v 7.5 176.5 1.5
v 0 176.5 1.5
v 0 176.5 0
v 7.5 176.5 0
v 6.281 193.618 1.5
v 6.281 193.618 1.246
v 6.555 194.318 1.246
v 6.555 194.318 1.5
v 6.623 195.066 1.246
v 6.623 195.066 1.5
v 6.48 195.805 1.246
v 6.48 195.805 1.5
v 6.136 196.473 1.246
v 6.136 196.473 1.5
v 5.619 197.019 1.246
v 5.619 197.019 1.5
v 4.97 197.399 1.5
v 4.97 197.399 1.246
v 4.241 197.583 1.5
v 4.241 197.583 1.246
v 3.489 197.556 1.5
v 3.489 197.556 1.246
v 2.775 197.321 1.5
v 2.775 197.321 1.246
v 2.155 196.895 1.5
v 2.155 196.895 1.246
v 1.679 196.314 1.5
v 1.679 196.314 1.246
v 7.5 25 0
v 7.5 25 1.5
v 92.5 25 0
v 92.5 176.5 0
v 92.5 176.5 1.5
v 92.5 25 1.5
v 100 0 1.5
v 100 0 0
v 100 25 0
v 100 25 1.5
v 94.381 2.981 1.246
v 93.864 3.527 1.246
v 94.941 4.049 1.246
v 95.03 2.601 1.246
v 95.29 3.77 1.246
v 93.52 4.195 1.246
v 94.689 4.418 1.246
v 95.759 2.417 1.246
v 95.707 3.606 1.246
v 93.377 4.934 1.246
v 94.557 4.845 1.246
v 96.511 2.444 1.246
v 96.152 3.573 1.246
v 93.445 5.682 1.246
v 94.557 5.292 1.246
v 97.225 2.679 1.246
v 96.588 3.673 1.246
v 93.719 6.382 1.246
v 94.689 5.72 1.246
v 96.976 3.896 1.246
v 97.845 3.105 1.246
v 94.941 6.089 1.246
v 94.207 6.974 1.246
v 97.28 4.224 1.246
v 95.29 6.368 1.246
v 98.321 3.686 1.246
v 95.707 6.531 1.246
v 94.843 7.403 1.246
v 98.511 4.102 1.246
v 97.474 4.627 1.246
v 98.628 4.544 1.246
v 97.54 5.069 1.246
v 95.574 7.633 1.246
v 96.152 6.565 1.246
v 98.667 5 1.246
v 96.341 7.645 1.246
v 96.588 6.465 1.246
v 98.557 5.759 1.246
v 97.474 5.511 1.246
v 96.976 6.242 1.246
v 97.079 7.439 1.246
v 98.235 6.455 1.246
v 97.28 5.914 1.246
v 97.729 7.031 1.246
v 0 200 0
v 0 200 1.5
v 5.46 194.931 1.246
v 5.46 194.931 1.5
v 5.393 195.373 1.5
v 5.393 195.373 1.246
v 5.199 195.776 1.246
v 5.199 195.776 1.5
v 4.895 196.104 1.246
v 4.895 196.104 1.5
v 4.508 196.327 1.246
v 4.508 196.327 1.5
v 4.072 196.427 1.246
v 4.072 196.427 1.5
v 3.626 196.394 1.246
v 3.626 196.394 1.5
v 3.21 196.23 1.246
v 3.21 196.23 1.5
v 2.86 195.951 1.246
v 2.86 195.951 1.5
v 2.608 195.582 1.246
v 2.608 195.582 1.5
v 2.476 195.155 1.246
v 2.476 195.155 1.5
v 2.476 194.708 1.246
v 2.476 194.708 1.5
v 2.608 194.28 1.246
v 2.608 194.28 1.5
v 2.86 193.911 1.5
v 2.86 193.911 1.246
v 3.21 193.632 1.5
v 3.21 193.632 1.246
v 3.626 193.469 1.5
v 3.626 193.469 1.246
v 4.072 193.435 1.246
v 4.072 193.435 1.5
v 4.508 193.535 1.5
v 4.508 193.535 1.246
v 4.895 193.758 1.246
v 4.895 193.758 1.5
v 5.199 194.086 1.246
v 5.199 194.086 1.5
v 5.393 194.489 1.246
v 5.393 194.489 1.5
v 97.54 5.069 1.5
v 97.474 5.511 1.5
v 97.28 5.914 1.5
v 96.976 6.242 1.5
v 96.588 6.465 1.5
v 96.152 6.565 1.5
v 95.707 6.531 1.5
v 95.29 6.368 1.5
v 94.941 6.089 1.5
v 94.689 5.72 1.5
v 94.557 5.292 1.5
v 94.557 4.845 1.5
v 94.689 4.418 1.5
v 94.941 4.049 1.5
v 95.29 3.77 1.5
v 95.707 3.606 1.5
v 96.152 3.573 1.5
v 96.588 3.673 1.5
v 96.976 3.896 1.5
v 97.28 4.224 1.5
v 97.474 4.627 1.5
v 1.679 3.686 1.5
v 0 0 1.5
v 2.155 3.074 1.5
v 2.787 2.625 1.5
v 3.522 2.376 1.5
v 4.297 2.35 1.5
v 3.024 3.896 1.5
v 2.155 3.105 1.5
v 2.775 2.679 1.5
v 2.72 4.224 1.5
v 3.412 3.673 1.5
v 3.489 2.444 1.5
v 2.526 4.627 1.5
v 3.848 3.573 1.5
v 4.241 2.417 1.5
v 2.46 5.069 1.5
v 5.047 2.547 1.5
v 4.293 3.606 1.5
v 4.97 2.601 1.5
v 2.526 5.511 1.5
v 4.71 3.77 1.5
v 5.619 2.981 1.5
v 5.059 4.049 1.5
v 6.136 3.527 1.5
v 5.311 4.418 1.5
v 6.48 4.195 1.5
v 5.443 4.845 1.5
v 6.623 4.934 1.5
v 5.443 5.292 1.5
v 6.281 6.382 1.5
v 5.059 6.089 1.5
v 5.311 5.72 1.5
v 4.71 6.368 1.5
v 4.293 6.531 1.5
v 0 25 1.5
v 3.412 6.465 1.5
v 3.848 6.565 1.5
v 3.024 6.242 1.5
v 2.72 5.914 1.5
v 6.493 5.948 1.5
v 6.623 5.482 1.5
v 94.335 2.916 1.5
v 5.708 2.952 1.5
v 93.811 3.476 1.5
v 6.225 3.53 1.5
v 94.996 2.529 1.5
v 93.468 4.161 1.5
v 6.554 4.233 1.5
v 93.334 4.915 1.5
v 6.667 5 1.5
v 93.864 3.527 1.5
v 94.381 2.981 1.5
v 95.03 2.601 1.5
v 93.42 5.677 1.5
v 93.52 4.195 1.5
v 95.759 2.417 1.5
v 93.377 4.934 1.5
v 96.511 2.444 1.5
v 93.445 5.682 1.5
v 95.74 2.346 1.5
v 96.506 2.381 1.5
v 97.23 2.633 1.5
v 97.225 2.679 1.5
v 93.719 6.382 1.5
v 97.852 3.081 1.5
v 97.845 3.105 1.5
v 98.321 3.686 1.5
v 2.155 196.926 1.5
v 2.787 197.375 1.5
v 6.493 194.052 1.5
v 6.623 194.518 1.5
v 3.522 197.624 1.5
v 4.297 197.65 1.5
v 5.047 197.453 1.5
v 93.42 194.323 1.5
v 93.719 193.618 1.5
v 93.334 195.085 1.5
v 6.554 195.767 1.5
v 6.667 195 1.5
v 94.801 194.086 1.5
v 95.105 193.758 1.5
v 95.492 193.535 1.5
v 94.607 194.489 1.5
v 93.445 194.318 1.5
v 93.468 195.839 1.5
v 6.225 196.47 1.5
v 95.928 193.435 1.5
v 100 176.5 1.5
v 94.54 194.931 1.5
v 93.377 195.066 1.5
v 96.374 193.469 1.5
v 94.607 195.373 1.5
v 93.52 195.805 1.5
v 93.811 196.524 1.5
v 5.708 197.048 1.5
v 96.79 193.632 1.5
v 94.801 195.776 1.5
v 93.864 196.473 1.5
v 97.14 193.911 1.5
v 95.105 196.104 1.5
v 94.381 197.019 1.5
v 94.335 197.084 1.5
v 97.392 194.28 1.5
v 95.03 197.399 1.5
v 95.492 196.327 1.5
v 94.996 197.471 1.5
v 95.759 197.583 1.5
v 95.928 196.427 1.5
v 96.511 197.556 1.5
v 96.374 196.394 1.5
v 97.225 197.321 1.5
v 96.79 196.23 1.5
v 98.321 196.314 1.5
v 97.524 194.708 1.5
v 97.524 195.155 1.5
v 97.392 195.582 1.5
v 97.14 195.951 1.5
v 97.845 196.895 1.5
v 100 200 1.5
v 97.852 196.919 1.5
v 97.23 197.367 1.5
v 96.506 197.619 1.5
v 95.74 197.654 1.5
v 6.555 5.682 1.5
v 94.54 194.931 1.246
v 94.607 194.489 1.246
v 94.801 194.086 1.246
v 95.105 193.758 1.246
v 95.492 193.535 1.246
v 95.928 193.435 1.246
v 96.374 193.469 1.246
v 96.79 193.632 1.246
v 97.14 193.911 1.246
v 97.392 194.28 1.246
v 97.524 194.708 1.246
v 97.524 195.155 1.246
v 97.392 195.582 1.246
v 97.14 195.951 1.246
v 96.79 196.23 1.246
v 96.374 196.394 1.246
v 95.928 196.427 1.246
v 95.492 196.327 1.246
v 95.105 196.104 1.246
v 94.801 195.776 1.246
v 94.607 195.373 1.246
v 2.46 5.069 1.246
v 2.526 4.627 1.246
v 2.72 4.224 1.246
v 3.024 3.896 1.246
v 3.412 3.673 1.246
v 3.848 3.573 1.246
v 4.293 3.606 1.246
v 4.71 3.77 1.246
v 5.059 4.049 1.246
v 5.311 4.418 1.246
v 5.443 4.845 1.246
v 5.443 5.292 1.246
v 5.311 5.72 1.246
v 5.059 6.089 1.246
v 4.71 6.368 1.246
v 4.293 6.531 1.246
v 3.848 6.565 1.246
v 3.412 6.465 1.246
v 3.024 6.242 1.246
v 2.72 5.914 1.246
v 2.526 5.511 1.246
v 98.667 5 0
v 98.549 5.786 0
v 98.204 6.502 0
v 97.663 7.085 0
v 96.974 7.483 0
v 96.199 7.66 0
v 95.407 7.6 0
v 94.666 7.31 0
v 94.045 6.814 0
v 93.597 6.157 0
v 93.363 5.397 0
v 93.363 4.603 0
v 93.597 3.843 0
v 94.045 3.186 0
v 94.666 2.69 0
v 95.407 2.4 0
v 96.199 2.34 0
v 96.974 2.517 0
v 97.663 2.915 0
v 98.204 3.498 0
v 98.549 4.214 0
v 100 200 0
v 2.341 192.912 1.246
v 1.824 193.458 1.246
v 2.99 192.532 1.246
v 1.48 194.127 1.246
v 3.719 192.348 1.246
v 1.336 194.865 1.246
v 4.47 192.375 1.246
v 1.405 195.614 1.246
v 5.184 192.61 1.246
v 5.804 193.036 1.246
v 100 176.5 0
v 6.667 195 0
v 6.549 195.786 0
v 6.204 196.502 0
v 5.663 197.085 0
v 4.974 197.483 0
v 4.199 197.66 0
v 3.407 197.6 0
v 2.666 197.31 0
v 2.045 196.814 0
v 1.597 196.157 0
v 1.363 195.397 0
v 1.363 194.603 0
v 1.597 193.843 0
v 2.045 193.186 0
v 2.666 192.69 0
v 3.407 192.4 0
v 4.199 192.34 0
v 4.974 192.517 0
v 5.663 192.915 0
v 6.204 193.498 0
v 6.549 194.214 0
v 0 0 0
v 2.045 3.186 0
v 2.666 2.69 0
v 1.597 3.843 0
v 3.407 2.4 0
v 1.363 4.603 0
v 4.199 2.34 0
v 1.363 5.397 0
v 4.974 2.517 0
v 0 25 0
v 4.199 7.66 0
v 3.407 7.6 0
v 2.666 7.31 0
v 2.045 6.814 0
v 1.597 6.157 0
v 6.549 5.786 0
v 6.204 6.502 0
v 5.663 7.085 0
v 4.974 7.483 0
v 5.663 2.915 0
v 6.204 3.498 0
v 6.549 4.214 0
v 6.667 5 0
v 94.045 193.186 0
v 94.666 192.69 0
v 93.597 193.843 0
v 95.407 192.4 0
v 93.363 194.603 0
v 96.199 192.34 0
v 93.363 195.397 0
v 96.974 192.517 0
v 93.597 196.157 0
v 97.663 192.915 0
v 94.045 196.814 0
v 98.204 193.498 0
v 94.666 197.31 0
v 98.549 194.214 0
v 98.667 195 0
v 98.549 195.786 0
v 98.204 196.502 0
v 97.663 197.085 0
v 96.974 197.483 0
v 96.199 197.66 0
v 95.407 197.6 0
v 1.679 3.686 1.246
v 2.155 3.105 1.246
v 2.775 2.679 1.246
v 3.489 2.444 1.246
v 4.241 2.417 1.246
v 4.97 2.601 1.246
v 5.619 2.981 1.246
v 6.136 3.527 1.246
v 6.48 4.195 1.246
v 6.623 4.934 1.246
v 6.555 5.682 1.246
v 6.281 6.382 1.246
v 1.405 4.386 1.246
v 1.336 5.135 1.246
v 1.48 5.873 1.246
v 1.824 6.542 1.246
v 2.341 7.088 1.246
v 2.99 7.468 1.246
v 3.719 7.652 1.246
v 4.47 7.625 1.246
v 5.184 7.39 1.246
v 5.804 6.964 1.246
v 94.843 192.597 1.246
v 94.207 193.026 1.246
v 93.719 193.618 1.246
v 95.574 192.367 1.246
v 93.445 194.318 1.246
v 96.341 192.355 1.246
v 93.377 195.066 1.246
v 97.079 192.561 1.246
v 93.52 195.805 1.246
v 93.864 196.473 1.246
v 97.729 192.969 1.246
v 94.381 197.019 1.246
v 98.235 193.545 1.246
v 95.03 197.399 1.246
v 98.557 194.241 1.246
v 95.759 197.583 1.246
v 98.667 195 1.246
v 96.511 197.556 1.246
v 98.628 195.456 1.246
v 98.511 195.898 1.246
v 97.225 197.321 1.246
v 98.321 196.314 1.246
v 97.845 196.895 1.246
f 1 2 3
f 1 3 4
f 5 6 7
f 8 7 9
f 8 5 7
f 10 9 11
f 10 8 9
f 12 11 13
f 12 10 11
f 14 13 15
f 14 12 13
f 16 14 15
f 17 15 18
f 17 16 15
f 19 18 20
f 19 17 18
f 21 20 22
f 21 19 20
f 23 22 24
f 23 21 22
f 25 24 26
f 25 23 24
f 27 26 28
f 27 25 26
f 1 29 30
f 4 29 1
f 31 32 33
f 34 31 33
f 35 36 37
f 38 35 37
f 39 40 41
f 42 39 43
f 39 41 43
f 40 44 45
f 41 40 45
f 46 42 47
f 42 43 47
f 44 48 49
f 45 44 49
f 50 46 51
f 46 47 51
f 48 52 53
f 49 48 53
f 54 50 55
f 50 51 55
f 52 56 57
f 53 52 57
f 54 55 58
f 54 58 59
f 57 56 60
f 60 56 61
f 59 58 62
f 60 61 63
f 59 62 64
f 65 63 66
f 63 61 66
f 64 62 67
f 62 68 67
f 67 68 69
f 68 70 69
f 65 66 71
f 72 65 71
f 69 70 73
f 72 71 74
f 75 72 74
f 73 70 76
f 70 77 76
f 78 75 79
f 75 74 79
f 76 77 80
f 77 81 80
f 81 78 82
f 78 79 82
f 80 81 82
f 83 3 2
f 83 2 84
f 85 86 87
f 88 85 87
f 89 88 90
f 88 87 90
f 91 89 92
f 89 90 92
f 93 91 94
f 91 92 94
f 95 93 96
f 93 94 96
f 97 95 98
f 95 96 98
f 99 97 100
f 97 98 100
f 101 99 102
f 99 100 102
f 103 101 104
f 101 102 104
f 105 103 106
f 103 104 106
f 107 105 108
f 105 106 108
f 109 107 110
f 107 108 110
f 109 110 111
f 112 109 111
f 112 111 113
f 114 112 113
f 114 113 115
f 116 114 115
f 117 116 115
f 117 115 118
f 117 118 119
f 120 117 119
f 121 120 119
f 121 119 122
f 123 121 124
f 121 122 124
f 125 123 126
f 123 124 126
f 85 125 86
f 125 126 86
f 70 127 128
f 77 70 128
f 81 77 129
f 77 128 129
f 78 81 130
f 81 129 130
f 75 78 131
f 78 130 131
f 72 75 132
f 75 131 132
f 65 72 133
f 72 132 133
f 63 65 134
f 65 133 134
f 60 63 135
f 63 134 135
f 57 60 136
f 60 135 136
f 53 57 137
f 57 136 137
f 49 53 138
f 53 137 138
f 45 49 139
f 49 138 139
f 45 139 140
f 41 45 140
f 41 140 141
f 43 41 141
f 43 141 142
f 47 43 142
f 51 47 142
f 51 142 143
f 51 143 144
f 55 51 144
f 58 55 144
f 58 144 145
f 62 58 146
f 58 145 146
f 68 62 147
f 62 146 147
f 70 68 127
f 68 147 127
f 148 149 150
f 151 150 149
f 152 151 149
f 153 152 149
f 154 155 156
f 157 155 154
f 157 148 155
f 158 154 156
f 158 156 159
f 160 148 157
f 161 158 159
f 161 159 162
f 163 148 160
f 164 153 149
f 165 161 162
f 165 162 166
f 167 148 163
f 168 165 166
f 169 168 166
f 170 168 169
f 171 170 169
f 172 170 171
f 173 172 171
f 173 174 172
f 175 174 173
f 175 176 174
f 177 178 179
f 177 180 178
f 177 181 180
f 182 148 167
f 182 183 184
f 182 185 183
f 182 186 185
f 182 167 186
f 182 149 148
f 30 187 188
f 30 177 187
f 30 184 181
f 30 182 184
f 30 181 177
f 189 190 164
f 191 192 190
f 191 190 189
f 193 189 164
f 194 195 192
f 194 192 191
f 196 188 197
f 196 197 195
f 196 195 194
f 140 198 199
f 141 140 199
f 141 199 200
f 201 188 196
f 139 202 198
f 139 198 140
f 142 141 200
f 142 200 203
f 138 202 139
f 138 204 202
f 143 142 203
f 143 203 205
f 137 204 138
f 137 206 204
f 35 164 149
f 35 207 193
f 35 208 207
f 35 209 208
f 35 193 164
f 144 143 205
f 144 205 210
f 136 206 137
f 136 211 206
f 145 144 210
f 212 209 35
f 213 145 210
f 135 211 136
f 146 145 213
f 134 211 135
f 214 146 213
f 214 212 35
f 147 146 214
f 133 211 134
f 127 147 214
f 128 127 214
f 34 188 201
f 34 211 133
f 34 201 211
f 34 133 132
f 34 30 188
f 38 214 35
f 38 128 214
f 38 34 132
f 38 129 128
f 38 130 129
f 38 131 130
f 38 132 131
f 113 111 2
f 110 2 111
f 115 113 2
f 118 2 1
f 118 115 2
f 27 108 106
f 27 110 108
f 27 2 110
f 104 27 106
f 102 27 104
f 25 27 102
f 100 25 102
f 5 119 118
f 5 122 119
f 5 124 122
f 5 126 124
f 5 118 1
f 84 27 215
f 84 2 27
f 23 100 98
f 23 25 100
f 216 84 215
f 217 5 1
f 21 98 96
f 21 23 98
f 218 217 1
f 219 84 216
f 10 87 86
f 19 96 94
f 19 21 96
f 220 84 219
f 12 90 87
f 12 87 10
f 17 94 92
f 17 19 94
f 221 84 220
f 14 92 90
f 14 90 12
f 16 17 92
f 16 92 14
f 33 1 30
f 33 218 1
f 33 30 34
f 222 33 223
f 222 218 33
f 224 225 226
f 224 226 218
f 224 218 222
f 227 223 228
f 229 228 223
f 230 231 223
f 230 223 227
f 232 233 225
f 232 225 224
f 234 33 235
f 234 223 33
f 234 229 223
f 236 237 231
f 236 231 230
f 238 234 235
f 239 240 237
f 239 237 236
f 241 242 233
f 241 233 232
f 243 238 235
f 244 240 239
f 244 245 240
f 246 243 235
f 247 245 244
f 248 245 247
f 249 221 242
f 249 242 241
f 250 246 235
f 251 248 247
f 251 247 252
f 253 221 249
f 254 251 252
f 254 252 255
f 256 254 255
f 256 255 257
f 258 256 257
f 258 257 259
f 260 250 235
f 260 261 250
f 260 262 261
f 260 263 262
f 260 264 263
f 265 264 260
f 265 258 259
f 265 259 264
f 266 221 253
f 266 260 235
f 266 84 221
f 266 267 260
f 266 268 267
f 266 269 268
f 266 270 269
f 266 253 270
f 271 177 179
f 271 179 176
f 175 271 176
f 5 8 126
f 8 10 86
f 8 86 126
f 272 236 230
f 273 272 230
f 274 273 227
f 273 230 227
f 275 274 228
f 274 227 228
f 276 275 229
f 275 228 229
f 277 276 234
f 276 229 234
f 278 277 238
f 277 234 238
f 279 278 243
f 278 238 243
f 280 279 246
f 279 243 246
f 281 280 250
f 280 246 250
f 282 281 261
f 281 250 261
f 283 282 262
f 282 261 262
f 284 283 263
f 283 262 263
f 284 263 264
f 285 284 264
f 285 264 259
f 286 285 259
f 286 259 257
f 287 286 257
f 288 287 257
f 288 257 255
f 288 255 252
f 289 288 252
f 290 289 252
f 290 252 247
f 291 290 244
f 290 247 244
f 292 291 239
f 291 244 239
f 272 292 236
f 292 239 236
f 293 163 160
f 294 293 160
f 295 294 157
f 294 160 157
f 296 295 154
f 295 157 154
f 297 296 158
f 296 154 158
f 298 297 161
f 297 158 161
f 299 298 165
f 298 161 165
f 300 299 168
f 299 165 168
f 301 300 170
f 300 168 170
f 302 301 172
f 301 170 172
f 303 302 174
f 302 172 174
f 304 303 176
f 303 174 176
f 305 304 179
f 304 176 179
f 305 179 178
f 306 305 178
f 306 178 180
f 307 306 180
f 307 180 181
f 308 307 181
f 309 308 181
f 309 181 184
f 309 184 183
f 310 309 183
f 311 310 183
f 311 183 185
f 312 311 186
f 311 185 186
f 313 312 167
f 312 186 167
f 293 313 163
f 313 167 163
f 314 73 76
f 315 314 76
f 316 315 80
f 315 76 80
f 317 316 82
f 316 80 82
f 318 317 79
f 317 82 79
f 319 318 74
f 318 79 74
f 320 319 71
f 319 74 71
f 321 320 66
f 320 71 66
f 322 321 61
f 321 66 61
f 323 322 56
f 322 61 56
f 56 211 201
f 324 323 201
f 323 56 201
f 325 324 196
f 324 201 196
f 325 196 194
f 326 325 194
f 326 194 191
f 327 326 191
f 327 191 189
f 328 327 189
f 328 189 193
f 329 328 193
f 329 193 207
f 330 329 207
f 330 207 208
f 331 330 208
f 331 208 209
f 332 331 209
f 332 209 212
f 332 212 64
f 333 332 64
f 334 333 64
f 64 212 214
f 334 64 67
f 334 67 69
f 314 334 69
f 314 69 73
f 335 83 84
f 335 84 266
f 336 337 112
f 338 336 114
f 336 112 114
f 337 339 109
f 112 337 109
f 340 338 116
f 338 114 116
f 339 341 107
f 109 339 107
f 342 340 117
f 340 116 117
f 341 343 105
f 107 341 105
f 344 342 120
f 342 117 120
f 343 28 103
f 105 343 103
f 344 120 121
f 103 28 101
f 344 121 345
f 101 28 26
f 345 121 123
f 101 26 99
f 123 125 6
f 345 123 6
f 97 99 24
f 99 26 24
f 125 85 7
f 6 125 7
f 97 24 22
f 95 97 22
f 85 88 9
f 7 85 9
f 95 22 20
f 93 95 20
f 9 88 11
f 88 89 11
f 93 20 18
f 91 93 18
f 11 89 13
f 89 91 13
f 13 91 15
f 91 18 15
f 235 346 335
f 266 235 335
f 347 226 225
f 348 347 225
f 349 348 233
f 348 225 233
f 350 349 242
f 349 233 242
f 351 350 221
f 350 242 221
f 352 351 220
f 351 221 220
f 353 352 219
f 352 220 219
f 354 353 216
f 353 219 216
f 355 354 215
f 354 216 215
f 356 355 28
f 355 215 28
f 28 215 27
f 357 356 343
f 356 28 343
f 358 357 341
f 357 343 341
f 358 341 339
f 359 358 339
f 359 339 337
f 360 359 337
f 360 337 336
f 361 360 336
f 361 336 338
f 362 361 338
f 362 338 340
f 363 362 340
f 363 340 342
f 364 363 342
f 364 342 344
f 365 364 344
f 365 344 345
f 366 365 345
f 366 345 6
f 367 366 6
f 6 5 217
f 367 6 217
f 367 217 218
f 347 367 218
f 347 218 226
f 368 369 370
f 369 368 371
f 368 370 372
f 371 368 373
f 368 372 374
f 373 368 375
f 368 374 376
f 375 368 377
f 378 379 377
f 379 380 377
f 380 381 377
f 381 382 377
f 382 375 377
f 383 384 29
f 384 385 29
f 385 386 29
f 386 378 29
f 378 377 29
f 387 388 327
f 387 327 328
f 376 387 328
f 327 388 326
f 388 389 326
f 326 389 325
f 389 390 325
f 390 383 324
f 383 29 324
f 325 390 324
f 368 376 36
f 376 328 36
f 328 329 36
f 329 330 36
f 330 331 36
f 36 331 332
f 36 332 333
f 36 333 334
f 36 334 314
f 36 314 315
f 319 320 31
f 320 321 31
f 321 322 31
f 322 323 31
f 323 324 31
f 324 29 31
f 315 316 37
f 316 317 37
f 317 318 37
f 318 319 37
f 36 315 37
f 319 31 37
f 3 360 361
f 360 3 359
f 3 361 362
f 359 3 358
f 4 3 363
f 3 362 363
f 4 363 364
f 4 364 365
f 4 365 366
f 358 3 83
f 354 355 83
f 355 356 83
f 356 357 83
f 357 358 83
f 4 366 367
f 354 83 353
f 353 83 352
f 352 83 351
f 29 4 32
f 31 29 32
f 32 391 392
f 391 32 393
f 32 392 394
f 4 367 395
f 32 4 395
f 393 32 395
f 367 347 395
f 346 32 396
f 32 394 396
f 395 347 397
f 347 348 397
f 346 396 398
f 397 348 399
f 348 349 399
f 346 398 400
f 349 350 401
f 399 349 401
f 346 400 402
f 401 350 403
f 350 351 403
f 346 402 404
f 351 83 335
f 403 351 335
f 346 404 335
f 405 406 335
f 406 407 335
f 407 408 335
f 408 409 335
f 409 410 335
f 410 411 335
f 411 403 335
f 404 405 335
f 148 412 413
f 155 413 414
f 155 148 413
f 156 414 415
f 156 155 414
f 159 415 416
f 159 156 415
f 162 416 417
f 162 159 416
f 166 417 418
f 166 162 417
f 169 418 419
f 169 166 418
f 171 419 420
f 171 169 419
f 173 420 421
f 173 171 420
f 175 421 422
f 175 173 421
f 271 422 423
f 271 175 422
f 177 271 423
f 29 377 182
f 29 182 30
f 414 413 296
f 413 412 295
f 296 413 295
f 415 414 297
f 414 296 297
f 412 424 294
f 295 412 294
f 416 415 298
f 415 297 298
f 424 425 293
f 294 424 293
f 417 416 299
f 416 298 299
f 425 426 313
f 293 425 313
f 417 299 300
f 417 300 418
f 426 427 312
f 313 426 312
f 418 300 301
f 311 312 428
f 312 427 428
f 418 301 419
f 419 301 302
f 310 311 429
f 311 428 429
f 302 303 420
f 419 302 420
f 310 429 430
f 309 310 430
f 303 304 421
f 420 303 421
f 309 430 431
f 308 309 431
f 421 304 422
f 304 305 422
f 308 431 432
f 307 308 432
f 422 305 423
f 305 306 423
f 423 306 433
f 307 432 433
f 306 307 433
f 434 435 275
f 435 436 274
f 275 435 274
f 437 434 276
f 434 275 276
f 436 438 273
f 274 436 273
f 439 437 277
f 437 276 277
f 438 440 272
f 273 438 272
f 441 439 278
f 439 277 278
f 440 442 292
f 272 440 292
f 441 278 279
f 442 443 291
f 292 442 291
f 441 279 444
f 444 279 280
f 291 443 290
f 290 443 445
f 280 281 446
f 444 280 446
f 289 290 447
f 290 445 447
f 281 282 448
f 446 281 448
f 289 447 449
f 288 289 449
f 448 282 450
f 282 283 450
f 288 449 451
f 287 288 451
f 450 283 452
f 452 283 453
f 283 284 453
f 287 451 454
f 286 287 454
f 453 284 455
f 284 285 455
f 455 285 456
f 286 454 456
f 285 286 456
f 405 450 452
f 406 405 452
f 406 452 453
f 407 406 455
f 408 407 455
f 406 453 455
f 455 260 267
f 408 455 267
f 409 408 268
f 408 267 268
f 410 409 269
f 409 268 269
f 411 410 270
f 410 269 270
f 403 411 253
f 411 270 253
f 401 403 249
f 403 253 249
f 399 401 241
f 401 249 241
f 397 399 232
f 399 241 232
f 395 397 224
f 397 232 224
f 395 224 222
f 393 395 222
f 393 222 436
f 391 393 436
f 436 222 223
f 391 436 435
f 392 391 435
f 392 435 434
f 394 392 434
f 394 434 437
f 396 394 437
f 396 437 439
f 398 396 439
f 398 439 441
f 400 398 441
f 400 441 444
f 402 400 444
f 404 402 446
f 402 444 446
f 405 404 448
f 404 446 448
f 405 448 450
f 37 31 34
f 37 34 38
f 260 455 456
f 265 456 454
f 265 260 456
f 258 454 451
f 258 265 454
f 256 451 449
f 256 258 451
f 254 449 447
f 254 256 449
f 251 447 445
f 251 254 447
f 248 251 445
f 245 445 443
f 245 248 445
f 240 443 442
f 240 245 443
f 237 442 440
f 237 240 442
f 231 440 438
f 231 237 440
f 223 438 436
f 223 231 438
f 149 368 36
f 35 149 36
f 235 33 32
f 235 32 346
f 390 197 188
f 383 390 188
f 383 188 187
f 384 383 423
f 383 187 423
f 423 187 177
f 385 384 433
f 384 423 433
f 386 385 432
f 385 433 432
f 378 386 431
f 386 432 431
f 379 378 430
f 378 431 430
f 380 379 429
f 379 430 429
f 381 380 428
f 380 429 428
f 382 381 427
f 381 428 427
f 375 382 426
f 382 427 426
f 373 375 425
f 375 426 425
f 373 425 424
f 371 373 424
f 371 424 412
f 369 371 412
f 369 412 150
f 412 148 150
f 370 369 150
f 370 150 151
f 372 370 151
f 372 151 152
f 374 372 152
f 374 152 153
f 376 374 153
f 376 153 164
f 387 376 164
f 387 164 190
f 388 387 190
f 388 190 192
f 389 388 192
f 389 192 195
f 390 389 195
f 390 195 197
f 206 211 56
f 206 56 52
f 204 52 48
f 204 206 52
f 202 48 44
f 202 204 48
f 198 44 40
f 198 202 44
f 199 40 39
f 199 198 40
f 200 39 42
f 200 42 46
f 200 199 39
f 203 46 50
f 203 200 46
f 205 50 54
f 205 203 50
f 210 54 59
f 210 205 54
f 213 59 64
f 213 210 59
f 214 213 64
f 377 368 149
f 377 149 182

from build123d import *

# Parameters (mm, degrees)
SKETCH2_W           = 100
SKETCH2_H           = 200
BOSS_EXTRUDE1_DEPTH = 1.5
SKETCH4_R           = 2.667
CUT_EXTRUDE1_DEPTH  = 2
SKETCH5_R           = 2.667
SKETCH5_R_2         = 1.5
BOSS_EXTRUDE2_DEPTH = 0.254
SKETCH6_W           = 7.5
SKETCH6_H           = 150
CUT_EXTRUDE2_DEPTH  = 1.5
SKETCH7_W           = 7.5
SKETCH7_H           = 1.5
CUT_EXTRUDE3_DEPTH  = 1.5


with BuildPart() as part:
    # Sketch2 → Boss-Extrude1 (new body)
    with BuildSketch(Plane.XY):
        with Locations((50, 100)):
            Rectangle(SKETCH2_W, SKETCH2_H)
    extrude(amount=BOSS_EXTRUDE1_DEPTH)

    # Sketch4 → Cut-Extrude1 (cut)
    with BuildSketch(Plane.XY.offset(1.5)):
        with Locations((4, 195)):
            Circle(SKETCH4_R)
        with Locations((96, 195)):
            Circle(SKETCH4_R)
        with Locations((96, 5)):
            Circle(SKETCH4_R)
        with Locations((4, 5)):
            Circle(SKETCH4_R)
    extrude(amount=-CUT_EXTRUDE1_DEPTH, mode=Mode.SUBTRACT)

    # Sketch5 → Boss-Extrude2 (add)
    # profile 1 of 4: a face of its own
    with BuildSketch(Plane.XY.offset(1.5)):
        with Locations((3.959685834, 5.068811707)):
            Circle(SKETCH5_R)
        with Locations(Location((3.959685834, 5.068811707, 0), (0, 0, 180))):
            Circle(SKETCH5_R_2, mode=Mode.SUBTRACT)
    # profile 2 of 4: a face of its own
    with BuildSketch(Plane.XY.offset(1.5)):
        with Locations((3.959685834, 194.931188293)):
            Circle(SKETCH5_R)
        with Locations((3.959685834, 194.931188293)):
            Circle(SKETCH5_R_2, mode=Mode.SUBTRACT)
    # profile 3 of 4: a face of its own
    with BuildSketch(Plane.XY.offset(1.5)):
        with Locations((96.040314166, 5.068811707)):
            Circle(SKETCH5_R)
        with Locations((96.040314166, 5.068811707)):
            Circle(SKETCH5_R_2, mode=Mode.SUBTRACT)
    # profile 4 of 4: a face of its own
    with BuildSketch(Plane.XY.offset(1.5)):
        with Locations((96.040314166, 194.931188293)):
            Circle(SKETCH5_R)
        with Locations(Location((96.040314166, 194.931188293, 0), (0, 0, 180))):
            Circle(SKETCH5_R_2, mode=Mode.SUBTRACT)
    extrude(amount=-BOSS_EXTRUDE2_DEPTH)

    # Sketch6 → Cut-Extrude2 (cut)
    with BuildSketch(Plane.XY):
        with Locations((3.75, 100)):
            Rectangle(SKETCH6_W, SKETCH6_H)
        with Locations((96.25, 100)):
            Rectangle(SKETCH6_W, SKETCH6_H)
    extrude(amount=CUT_EXTRUDE2_DEPTH, mode=Mode.SUBTRACT)

    # Sketch7 → Cut-Extrude3 (cut)
    with BuildSketch(Plane.XZ.offset(-175)):
        with Locations((3.75, 0.75)):
            Rectangle(SKETCH7_W, SKETCH7_H)
        with Locations((96.25, 0.75)):
            Rectangle(SKETCH7_W, SKETCH7_H)
    extrude(amount=-CUT_EXTRUDE3_DEPTH, mode=Mode.SUBTRACT)


solid = part.part
